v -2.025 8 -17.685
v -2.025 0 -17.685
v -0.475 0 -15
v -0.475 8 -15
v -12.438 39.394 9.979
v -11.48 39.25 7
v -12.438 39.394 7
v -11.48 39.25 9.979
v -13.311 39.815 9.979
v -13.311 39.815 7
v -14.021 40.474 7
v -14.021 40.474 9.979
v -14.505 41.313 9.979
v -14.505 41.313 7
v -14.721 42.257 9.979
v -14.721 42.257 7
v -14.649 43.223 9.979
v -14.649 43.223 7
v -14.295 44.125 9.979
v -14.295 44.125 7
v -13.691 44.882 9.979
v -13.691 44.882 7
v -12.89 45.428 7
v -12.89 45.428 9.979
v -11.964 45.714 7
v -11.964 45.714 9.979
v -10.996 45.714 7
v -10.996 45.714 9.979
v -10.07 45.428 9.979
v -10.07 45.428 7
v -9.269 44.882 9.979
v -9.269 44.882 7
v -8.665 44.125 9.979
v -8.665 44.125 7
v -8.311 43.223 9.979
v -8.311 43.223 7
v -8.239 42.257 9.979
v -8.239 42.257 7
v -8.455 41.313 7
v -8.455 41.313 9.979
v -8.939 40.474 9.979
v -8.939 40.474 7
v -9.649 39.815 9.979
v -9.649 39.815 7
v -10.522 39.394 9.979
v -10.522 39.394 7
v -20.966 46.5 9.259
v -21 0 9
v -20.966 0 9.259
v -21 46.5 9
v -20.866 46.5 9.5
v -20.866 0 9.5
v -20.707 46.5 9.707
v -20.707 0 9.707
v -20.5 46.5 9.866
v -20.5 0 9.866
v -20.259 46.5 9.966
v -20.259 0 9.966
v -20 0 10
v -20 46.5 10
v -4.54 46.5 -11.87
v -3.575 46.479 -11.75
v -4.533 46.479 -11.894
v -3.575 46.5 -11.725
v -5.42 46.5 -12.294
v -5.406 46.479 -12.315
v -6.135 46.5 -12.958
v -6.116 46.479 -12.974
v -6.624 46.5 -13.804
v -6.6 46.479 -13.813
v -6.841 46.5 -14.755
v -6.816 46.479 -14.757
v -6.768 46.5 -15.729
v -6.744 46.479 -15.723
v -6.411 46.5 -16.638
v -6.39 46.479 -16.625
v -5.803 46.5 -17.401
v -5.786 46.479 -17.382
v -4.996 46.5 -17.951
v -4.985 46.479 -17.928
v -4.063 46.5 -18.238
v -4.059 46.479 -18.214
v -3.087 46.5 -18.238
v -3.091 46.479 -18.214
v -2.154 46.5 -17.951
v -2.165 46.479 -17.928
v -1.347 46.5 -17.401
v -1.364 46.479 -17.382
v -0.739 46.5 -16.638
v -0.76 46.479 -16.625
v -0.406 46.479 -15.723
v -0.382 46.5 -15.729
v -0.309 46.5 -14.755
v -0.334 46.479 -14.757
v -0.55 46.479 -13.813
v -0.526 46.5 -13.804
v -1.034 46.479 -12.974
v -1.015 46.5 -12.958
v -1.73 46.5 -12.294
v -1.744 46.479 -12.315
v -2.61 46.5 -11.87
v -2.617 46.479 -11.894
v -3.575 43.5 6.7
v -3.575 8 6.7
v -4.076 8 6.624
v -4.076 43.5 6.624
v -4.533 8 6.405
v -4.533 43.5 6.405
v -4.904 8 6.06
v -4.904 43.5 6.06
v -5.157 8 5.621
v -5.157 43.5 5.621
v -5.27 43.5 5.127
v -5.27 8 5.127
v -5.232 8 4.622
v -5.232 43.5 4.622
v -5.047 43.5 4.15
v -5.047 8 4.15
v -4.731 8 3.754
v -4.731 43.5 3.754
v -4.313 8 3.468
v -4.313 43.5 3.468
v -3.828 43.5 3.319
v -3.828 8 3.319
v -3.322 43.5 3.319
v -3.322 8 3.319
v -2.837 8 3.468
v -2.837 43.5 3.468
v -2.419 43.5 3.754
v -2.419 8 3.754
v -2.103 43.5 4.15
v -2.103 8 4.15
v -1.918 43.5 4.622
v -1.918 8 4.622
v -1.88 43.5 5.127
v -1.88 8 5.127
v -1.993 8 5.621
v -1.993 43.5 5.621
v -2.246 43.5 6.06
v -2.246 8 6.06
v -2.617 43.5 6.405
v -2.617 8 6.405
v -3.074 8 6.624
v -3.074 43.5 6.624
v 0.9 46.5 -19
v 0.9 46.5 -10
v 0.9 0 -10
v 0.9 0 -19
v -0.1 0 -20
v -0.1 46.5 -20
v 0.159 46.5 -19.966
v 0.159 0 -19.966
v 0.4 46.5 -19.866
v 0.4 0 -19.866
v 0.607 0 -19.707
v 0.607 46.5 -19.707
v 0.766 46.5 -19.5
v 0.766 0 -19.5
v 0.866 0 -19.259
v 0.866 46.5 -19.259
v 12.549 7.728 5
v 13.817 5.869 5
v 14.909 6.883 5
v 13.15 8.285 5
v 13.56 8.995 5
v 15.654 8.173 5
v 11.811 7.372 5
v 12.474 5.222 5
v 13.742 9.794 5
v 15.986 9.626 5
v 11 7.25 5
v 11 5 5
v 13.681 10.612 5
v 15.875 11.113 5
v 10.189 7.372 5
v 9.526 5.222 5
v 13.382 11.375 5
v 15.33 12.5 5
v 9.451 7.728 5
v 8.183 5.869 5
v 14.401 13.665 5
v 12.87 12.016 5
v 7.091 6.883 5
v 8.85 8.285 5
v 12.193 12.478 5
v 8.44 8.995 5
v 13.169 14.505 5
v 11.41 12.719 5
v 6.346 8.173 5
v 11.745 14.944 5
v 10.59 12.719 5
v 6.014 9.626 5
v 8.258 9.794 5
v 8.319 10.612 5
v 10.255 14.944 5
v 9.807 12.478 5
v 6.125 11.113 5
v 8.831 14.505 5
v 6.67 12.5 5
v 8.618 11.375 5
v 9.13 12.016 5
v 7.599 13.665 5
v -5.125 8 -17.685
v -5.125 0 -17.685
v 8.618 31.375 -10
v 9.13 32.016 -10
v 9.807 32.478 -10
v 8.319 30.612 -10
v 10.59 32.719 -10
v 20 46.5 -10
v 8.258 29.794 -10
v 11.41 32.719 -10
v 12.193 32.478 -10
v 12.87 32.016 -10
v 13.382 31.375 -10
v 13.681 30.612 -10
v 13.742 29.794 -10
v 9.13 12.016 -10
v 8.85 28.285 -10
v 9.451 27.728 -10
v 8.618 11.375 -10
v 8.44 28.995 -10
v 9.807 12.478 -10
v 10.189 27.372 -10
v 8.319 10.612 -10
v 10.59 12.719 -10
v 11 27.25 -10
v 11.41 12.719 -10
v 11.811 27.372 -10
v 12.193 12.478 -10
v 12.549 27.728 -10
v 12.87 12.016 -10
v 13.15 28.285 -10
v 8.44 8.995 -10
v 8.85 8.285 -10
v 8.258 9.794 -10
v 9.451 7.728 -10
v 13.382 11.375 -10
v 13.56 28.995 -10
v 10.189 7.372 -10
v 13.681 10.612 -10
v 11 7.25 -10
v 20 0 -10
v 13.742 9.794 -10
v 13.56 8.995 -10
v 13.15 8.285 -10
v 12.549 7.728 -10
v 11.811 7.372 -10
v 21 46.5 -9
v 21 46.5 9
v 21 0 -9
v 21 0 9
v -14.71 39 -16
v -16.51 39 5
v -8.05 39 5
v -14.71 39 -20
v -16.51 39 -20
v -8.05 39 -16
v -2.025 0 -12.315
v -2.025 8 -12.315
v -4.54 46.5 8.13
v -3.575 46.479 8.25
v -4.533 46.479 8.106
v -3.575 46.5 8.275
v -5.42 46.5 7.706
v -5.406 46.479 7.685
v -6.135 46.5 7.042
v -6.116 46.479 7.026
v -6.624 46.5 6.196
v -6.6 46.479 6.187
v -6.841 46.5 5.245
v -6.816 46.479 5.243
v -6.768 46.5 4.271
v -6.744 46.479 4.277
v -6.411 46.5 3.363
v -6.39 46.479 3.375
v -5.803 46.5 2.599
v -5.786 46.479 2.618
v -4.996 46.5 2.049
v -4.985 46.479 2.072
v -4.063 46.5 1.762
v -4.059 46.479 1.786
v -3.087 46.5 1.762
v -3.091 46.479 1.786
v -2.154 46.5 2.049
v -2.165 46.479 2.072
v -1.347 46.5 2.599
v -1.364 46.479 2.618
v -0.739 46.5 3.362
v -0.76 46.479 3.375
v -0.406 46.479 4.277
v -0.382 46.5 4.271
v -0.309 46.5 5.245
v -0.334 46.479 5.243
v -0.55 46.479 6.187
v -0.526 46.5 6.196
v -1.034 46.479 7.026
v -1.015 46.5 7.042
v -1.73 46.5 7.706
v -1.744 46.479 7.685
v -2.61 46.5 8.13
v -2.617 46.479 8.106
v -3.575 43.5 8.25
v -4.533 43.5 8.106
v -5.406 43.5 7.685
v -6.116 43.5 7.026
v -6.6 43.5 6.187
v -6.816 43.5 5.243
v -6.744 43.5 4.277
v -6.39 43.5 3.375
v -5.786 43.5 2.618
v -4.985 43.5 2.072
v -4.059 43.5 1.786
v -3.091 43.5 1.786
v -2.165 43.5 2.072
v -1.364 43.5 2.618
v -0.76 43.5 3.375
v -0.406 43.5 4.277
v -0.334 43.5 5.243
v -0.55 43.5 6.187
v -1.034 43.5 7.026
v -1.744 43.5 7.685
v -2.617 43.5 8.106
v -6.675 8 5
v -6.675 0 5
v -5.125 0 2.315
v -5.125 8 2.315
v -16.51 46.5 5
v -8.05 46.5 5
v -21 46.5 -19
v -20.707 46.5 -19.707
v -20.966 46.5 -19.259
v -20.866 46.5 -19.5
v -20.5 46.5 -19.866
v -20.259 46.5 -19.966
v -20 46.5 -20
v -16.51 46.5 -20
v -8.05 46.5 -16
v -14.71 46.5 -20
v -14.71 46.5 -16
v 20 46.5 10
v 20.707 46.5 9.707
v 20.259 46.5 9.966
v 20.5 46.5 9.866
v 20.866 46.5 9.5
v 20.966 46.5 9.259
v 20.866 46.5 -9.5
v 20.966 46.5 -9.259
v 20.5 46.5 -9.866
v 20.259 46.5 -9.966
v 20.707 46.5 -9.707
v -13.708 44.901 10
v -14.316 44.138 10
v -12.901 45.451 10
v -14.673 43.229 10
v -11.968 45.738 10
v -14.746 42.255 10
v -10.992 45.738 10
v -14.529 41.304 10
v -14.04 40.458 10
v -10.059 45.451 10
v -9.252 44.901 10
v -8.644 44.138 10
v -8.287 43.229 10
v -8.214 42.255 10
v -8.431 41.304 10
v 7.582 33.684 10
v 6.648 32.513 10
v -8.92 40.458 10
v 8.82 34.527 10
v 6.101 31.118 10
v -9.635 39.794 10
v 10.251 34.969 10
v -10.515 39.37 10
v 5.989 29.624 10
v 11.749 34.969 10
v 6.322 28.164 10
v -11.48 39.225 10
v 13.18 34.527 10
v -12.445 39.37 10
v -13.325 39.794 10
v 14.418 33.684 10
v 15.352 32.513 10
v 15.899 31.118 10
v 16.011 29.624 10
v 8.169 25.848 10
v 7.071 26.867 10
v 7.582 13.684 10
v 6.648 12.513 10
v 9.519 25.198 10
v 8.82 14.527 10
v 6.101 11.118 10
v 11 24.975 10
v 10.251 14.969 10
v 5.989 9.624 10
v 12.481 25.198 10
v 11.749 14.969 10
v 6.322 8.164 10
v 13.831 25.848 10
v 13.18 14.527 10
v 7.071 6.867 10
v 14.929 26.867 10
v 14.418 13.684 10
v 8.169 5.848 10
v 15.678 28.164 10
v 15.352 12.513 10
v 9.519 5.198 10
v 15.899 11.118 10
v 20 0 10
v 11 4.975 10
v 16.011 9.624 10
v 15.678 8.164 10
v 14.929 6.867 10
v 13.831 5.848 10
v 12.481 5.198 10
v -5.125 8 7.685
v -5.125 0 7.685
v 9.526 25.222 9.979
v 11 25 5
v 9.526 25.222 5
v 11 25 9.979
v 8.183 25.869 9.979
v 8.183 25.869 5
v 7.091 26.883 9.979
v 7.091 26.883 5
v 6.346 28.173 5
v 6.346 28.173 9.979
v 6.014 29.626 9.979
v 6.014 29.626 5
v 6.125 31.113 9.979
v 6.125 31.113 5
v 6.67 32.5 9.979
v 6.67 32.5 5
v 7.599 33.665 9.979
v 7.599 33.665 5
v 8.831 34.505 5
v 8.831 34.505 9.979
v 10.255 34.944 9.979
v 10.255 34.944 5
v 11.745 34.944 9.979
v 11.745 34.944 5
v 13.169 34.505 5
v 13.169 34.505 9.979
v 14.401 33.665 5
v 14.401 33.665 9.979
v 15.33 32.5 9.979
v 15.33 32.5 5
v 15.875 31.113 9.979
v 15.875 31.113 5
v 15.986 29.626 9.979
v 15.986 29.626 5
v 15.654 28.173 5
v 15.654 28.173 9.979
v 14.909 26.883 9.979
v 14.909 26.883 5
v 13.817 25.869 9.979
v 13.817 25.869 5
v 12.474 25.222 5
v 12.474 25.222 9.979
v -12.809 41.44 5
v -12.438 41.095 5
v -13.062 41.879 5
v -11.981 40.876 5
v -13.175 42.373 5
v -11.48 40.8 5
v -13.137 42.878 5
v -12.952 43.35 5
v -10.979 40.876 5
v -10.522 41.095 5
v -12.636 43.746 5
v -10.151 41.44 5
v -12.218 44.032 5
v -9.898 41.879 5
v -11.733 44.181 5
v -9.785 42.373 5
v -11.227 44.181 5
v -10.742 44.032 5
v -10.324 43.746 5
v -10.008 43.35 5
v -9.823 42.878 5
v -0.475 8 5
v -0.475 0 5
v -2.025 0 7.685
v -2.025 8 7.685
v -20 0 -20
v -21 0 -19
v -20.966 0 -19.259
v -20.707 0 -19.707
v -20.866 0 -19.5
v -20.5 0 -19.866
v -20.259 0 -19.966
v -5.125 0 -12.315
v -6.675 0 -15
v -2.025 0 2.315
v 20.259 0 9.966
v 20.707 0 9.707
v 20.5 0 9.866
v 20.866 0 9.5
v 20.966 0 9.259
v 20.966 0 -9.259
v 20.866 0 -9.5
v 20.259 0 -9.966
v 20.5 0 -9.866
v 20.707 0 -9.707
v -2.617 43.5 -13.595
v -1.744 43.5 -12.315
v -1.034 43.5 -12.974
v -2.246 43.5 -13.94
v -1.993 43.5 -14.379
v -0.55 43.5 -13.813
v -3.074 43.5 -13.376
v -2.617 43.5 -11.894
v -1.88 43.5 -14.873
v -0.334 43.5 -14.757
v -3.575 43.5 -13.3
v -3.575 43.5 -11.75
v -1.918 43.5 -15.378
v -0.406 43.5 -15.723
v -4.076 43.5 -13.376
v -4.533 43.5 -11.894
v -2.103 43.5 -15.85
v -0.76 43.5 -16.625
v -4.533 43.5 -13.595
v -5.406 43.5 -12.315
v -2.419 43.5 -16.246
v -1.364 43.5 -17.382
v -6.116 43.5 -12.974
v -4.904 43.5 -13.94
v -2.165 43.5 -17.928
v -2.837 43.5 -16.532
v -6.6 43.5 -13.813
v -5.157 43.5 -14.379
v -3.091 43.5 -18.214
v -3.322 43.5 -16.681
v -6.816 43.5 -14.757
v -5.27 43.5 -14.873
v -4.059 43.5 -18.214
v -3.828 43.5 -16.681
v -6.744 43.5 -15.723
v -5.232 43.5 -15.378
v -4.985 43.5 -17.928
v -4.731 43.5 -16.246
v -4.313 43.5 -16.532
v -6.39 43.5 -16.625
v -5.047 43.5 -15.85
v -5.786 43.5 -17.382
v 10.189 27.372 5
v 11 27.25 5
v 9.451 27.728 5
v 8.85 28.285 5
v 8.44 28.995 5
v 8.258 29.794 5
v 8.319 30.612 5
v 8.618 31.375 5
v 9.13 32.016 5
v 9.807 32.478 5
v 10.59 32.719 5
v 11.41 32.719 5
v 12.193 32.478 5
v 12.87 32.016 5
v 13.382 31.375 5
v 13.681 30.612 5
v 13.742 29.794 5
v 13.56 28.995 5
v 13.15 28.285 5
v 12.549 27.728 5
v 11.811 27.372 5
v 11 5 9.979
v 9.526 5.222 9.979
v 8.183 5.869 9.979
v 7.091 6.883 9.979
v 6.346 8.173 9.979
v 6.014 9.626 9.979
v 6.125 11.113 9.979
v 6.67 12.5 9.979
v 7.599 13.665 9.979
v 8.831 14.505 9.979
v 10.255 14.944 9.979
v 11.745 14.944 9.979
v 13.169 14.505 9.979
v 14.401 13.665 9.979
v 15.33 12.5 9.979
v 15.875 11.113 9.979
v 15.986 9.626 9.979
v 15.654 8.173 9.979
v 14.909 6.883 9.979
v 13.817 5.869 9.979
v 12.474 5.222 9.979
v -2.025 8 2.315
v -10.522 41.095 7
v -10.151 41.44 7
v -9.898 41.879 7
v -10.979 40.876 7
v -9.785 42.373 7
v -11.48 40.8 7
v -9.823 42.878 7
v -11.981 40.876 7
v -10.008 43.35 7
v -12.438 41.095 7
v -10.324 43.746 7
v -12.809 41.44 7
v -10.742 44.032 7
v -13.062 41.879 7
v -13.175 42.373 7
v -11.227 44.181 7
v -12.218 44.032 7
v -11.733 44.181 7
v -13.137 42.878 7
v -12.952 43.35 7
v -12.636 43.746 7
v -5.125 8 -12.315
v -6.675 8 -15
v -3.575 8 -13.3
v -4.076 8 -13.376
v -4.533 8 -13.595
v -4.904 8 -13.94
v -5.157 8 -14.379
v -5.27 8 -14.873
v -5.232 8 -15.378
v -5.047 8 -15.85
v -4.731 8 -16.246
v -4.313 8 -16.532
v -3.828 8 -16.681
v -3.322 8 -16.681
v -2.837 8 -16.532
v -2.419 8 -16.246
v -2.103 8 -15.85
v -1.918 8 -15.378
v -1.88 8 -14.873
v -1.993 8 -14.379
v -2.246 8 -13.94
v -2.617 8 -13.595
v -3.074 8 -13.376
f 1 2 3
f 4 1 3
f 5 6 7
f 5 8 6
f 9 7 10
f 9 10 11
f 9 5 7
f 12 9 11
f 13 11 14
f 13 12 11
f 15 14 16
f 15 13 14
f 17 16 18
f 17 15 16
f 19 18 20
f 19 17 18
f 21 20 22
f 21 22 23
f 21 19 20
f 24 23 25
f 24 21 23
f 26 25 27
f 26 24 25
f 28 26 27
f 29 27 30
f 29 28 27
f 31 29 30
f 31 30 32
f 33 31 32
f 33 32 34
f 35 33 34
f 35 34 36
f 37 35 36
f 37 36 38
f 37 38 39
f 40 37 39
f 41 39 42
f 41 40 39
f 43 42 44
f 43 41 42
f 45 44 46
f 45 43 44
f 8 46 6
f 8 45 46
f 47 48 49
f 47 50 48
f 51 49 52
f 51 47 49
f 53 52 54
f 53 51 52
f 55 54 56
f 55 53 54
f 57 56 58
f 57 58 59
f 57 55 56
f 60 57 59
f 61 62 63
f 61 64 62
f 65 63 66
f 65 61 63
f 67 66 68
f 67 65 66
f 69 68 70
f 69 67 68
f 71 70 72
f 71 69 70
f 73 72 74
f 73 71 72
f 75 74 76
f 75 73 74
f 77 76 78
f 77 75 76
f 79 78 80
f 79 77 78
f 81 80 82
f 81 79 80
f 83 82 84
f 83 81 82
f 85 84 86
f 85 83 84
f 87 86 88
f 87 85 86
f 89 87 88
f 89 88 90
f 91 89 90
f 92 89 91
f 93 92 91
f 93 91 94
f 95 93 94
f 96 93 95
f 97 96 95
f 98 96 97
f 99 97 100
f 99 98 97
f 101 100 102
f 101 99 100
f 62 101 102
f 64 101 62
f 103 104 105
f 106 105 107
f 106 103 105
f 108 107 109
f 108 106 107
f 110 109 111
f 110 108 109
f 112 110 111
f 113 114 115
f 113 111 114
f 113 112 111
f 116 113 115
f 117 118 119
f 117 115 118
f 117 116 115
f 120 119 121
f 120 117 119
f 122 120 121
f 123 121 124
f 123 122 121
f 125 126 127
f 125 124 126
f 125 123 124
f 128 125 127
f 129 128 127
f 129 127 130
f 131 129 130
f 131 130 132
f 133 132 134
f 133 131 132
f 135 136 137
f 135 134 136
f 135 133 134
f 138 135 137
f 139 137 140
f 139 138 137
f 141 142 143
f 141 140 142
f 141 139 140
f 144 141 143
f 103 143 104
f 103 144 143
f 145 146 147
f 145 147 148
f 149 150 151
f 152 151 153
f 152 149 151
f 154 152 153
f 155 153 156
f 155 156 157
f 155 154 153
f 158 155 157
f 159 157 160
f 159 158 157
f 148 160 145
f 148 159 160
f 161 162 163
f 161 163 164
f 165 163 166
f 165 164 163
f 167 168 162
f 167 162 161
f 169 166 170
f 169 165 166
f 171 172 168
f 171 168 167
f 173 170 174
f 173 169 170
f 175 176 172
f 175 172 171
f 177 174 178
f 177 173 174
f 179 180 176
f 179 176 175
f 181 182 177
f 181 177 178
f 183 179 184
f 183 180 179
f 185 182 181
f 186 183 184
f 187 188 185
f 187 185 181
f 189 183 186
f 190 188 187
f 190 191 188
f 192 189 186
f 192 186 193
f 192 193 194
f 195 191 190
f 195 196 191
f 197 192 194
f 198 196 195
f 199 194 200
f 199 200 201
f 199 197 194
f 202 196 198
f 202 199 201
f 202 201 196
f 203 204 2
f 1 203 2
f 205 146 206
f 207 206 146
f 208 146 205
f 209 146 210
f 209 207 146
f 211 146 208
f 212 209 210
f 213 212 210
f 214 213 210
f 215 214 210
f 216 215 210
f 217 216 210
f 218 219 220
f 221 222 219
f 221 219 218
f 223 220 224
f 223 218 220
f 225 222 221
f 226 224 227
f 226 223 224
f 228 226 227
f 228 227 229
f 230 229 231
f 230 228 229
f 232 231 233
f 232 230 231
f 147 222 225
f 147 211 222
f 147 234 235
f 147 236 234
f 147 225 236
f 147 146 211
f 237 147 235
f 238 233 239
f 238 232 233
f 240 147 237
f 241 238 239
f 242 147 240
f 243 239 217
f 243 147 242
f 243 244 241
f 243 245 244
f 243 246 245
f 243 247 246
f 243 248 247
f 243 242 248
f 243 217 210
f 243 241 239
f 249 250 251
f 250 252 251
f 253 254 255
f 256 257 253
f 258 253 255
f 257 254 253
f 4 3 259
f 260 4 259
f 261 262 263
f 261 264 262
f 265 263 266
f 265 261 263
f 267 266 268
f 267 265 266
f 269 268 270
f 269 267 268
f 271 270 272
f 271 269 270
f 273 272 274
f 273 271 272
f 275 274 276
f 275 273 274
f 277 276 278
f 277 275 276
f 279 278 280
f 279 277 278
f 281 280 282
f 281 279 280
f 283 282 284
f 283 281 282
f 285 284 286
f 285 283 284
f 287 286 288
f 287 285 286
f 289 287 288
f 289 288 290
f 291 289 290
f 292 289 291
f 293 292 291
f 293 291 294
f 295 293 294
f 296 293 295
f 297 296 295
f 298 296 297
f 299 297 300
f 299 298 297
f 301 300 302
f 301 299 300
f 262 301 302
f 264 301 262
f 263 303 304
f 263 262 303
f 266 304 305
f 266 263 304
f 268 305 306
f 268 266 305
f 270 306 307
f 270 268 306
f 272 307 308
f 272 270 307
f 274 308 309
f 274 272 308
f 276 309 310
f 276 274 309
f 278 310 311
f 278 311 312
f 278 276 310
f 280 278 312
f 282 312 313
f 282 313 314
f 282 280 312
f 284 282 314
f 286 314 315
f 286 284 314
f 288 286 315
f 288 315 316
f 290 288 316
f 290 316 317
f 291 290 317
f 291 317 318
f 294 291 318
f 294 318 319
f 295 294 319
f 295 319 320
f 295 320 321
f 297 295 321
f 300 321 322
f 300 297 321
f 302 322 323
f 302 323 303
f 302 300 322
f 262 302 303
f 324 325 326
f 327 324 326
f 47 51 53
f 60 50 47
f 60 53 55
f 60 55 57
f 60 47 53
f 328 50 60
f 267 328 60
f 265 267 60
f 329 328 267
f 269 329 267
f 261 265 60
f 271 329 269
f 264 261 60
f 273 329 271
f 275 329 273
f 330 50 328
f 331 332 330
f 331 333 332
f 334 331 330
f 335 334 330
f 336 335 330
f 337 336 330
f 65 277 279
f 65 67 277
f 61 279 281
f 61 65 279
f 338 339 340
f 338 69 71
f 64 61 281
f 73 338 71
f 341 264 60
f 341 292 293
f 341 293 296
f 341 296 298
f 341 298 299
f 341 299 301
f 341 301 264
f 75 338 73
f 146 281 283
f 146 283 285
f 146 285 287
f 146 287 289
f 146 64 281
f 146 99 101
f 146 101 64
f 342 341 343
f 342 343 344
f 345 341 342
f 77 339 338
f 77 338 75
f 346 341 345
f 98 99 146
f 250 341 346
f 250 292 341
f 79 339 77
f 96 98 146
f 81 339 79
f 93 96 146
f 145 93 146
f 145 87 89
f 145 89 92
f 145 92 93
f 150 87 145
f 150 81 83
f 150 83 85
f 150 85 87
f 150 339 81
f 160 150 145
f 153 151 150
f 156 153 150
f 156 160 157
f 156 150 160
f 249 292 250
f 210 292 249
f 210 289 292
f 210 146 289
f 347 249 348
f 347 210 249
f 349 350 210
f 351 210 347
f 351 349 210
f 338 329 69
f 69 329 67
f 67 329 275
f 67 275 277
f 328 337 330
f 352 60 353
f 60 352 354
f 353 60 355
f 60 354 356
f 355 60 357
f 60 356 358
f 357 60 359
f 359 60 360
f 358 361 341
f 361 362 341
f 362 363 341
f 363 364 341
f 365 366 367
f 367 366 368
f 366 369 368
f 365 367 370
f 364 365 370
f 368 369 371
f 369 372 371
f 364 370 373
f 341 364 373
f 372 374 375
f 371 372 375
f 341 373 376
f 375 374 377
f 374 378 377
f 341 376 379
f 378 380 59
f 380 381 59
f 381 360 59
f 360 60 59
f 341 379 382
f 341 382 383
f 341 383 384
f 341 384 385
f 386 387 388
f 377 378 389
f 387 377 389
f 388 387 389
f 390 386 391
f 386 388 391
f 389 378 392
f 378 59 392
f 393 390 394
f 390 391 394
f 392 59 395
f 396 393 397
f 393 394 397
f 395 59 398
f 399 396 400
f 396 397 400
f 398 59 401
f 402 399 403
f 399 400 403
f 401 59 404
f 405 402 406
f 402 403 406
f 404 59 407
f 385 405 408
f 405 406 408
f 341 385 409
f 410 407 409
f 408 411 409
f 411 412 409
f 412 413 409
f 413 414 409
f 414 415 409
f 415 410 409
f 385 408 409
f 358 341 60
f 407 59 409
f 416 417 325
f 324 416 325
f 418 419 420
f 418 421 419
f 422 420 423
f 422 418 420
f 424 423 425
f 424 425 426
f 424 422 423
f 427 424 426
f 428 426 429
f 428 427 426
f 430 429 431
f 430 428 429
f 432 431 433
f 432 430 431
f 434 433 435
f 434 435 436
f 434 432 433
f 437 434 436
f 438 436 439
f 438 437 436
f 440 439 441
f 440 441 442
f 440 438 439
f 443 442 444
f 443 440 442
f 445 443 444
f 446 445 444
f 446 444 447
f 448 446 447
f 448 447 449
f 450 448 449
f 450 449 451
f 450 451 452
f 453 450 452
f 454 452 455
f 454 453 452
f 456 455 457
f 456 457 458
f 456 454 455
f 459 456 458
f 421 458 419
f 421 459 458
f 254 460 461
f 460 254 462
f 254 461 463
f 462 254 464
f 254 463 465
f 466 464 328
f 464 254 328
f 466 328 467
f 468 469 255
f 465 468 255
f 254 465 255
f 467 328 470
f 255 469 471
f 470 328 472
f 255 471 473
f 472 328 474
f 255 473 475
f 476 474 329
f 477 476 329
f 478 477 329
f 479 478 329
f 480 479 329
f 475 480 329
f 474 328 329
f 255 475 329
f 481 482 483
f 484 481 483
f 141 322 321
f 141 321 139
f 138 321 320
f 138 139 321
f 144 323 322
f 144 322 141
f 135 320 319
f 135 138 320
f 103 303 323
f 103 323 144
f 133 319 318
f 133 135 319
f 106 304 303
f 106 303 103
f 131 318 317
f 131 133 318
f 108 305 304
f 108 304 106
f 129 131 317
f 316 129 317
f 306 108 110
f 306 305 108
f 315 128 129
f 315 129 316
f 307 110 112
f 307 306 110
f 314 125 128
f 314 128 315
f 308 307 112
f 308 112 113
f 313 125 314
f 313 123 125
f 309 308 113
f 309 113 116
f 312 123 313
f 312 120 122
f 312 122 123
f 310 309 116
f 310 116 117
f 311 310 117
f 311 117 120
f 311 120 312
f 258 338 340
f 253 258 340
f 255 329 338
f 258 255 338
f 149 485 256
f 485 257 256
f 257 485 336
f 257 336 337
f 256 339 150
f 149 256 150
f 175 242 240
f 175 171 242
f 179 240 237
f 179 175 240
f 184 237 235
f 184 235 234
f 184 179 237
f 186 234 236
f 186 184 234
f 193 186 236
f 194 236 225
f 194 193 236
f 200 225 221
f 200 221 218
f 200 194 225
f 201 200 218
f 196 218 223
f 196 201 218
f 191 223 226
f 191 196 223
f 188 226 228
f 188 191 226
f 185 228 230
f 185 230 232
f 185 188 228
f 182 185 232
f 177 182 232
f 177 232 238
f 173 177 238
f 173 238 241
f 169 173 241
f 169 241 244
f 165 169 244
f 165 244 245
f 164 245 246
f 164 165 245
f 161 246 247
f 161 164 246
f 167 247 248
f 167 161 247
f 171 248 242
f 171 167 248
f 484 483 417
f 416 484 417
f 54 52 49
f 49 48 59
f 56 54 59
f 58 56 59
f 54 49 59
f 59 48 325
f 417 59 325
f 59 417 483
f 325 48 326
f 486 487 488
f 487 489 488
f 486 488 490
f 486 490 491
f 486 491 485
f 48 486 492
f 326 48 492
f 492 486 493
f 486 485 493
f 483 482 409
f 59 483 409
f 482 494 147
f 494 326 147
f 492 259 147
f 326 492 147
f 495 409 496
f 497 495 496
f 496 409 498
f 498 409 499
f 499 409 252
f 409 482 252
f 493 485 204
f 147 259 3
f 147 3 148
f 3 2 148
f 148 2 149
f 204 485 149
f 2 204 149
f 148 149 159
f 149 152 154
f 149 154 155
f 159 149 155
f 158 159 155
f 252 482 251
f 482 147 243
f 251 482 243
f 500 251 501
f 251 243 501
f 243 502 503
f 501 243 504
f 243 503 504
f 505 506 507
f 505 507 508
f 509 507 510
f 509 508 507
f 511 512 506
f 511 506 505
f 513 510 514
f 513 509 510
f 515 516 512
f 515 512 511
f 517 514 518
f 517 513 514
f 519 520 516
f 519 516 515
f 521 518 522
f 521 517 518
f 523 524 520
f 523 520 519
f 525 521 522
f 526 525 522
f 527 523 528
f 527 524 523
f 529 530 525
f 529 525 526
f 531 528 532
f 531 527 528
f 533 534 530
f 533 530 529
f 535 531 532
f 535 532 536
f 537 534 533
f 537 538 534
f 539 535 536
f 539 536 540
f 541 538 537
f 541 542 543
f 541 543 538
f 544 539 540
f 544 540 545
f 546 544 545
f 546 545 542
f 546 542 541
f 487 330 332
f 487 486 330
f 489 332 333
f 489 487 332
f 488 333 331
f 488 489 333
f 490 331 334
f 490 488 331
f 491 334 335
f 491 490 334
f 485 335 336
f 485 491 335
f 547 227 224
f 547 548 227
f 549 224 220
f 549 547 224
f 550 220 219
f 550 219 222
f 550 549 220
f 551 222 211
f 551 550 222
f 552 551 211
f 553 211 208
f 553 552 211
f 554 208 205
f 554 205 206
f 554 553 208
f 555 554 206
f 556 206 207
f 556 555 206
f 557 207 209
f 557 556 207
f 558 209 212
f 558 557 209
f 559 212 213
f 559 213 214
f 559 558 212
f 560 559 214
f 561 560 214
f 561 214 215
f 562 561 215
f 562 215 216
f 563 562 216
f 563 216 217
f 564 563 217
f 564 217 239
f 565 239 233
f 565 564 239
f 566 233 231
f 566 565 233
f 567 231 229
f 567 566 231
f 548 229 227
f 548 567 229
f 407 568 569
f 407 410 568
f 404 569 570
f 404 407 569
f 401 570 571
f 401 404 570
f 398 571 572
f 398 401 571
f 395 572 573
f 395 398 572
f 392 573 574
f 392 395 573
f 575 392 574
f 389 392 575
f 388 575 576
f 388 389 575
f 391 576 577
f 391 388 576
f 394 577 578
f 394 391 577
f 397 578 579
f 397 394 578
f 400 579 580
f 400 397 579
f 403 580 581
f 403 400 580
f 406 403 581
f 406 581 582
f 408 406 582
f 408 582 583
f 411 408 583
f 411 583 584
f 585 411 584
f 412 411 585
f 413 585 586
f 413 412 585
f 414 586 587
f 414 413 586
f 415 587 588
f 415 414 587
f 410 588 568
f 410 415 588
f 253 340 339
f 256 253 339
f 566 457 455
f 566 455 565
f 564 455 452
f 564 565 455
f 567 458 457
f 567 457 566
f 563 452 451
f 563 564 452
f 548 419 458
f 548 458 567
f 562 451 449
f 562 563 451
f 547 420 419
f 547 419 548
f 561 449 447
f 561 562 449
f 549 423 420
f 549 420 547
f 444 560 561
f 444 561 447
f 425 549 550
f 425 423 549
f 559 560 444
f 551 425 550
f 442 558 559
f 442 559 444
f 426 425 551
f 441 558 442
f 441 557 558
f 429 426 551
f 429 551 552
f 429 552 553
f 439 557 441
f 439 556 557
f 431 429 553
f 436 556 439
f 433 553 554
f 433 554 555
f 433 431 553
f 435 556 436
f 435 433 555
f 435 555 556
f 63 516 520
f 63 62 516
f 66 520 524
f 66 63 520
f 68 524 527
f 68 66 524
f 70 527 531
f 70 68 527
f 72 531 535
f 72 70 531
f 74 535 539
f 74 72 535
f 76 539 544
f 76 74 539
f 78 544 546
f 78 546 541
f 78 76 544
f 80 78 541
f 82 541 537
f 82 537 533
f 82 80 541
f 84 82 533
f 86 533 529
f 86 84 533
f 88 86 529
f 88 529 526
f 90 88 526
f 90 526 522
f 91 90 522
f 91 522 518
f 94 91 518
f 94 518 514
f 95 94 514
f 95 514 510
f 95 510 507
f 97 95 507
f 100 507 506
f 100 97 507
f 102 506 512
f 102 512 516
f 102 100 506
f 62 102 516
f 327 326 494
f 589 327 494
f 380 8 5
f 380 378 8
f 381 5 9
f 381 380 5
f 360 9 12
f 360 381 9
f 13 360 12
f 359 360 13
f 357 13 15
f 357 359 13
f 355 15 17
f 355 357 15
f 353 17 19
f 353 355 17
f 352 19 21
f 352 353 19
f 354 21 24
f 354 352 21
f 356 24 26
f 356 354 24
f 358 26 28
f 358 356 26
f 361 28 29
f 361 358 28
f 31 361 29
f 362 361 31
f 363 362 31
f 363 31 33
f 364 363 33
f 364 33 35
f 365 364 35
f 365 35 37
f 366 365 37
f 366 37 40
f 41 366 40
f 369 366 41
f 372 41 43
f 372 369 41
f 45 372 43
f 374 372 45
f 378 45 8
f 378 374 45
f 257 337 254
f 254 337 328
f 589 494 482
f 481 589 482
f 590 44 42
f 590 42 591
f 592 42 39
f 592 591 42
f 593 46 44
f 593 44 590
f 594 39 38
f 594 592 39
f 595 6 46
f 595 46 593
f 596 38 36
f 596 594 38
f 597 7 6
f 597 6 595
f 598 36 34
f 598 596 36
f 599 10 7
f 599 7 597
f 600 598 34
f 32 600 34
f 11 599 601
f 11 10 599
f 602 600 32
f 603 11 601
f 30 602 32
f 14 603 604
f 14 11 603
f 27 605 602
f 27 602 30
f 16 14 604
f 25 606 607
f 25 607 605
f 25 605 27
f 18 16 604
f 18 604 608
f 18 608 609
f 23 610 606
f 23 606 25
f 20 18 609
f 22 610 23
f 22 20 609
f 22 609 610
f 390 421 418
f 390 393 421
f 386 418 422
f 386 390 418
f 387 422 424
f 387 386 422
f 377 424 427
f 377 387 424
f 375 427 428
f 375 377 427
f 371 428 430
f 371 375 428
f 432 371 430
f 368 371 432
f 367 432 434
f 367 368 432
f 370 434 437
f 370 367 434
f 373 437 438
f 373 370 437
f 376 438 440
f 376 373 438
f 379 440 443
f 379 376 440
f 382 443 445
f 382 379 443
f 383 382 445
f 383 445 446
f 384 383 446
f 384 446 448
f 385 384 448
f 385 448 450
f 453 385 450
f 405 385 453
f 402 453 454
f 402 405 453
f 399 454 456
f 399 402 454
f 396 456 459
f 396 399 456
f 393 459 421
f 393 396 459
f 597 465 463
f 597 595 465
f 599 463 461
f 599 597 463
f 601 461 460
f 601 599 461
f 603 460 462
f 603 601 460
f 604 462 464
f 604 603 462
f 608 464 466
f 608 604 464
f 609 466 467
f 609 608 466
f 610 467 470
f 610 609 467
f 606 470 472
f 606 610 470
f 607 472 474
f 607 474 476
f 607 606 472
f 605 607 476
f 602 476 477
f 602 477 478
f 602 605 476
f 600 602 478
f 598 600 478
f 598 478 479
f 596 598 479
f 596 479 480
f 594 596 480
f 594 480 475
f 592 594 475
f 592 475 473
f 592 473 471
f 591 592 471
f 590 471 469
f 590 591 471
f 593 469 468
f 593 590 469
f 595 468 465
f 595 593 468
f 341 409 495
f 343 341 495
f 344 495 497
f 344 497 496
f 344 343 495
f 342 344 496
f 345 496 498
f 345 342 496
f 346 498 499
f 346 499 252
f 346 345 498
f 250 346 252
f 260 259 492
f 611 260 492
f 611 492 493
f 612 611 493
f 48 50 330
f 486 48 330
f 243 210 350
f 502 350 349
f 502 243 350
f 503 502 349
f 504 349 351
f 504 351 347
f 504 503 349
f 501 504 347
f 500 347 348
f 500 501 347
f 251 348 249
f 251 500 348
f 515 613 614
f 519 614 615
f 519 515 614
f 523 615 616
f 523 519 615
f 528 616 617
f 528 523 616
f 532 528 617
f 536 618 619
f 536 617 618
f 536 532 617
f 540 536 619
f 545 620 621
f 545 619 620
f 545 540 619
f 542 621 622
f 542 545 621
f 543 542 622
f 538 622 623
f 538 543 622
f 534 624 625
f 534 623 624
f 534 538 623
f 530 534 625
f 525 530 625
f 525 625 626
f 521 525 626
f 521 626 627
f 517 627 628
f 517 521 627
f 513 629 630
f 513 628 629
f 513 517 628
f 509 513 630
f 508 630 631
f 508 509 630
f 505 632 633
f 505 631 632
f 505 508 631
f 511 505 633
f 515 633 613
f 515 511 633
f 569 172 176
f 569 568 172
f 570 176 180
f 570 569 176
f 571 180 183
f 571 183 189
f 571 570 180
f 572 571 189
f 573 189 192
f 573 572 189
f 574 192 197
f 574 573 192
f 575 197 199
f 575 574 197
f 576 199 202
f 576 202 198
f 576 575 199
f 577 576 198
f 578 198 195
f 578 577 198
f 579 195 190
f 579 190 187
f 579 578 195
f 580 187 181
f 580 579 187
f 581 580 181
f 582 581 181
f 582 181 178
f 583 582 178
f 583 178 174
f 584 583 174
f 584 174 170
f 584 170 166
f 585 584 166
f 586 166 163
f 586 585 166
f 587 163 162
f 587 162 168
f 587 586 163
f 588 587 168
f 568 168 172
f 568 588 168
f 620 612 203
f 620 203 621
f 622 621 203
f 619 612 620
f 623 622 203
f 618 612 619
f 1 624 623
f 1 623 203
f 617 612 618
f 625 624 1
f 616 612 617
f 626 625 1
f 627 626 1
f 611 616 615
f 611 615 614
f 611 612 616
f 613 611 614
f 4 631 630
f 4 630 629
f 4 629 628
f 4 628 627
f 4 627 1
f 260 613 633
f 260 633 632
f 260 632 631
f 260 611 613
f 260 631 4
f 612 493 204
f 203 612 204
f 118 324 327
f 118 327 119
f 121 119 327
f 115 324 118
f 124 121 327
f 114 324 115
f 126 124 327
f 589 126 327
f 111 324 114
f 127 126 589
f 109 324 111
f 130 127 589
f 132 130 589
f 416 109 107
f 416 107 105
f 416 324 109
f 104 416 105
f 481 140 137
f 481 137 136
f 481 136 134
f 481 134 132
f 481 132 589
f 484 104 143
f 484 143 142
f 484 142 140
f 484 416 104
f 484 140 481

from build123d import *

# Parameters (mm, degrees)
SKETCH1_W                     = 42
SKETCH1_H                     = 20
BOSS_EXTRUDE1_DEPTH           = 40
CBORE_FOR_M5_SHCS1_AT_2_COUNT = 2
CBORE_FOR_M5_SHCS1_AT_2_PITCH = 20
SKETCH5_W                     = 42
SKETCH5_H                     = 20
BOSS_EXTRUDE2_DEPTH           = 6.5
SKETCH12_W                    = 21.9
SKETCH12_H                    = 10
BOSS_EXTRUDE3_DEPTH           = 46.5
CUT_EXTRUDE1_DEPTH            = 7.5
FILLET1_R                     = 1
CBORE_FOR_M3_SHCS2_AT_2_COUNT = 2
CBORE_FOR_M3_SHCS2_AT_2_PITCH = 20
CUT_EXTRUDE2_DEPTH            = 8


with BuildPart() as part:
    # Sketch1 → Boss-Extrude1 (new body)
    with BuildSketch(Plane(origin=(0, 0, 0), x_dir=(1, 0, 0), z_dir=(0, 1, 0))):
        Rectangle(SKETCH1_W, SKETCH1_H)
    extrude(amount=BOSS_EXTRUDE1_DEPTH)

    # Sketch4 → CBORE for M5 SHCS1 (revolve, cut)
    with BuildSketch(Plane(origin=(11, 30, 10), x_dir=(0, -1, 0), z_dir=(1, 0, 0))):
        Polygon((0, 0), (0, 20), (2.75, 20), (2.75, 5), (5, 5), (5, 0.020977491), (5.025, 0), align=None)
    cbore_for_m5_shcs1 = revolve(axis=Axis((11, 30, 16.35), (0, 0, -1)), mode=Mode.SUBTRACT)

    # CBORE for M5 SHCS1 at 2: CBORE for M5 SHCS1 ×2
    with Locations(*[(0, -i * CBORE_FOR_M5_SHCS1_AT_2_PITCH, 0) for i in range(1, CBORE_FOR_M5_SHCS1_AT_2_COUNT)]):
        add(cbore_for_m5_shcs1, mode=Mode.SUBTRACT)

    # Sketch5 → Boss-Extrude2 (add)
    with BuildSketch(Plane(origin=(0, 40, 0), x_dir=(1, 0, 0), z_dir=(0, 1, 0))):
        Rectangle(SKETCH5_W, SKETCH5_H)
    extrude(amount=BOSS_EXTRUDE2_DEPTH)

    # Sketch12 → Boss-Extrude3 (add)
    with BuildSketch(Plane(origin=(0, 46.5, 0), x_dir=(1, 0, 0), z_dir=(0, 1, 0))):
        with Locations((-10.05, 15)):
            Rectangle(SKETCH12_W, SKETCH12_H)
    extrude(amount=-BOSS_EXTRUDE3_DEPTH)

    # Sketch6 → Cut-Extrude1 (cut)
    with BuildSketch(Plane(origin=(0, 46.5, 0), x_dir=(1, 0, 0), z_dir=(0, 1, 0))):
        Polygon((-16.51, 20), (-16.51, -5), (-8.05, -5), (-8.05, 16), (-14.71, 16), (-14.71, 20), align=None)
    extrude(amount=-CUT_EXTRUDE1_DEPTH, mode=Mode.SUBTRACT)

    # Fillet1
    fillet1_edges = [part.edges().sort_by_distance(p)[0] for p in [
        (0.9, 23.25, -20),
        (-21, 23.25, -20),
        (21, 23.25, -10),
        (21, 23.25, 10),
        (-21, 23.25, 10),
    ]]
    fillet(fillet1_edges, radius=FILLET1_R)

    # Sketch11 → CBORE for M3 SHCS1 (revolve, cut)
    with BuildSketch(Plane(origin=(-11.48, 42.5, 10), x_dir=(0, -1, 0), z_dir=(1, 0, 0))):
        Polygon((0, 0), (0, 6.021463052), (1.7, 5), (1.7, 3), (3.25, 3), (3.25, 0.020977491), (3.275, 0), align=None)
    revolve(axis=Axis((-11.48, 42.5, 16.35), (0, 0, -1)), mode=Mode.SUBTRACT)

    # Sketch16 → CBORE for M3 SHCS2 (revolve, cut)
    with BuildSketch(Plane(origin=(-3.575, 46.5, -15), x_dir=(0, 0, 1), z_dir=(1, 0, 0))):
        Polygon((0, 0), (0, 46.5), (1.7, 46.5), (1.7, 3), (3.25, 3), (3.25, 0.020977491), (3.275, 0), align=None)
    cbore_for_m3_shcs2 = revolve(axis=Axis((-3.575, 52.85, -15), (0, -1, 0)), mode=Mode.SUBTRACT)

    # CBORE for M3 SHCS2 at 2: CBORE for M3 SHCS2 ×2
    with Locations(*[(0, 0, i * CBORE_FOR_M3_SHCS2_AT_2_PITCH) for i in range(1, CBORE_FOR_M3_SHCS2_AT_2_COUNT)]):
        add(cbore_for_m3_shcs2, mode=Mode.SUBTRACT)

    # Sketch18 → Cut-Extrude2 (cut)
    with BuildSketch(Plane.XZ):
        Polygon((-0.475, 5), (-2.025, 7.684678752), (-5.125, 7.684678752), (-6.675, 5), (-5.125, 2.315321248), (-2.025, 2.315321248), align=None)
        Polygon((-0.475, -15), (-2.025, -12.315321248), (-5.125, -12.315321248), (-6.675, -15), (-5.125, -17.684678752), (-2.025, -17.684678752), align=None)
    extrude(amount=-CUT_EXTRUDE2_DEPTH, mode=Mode.SUBTRACT)


solid = part.part
